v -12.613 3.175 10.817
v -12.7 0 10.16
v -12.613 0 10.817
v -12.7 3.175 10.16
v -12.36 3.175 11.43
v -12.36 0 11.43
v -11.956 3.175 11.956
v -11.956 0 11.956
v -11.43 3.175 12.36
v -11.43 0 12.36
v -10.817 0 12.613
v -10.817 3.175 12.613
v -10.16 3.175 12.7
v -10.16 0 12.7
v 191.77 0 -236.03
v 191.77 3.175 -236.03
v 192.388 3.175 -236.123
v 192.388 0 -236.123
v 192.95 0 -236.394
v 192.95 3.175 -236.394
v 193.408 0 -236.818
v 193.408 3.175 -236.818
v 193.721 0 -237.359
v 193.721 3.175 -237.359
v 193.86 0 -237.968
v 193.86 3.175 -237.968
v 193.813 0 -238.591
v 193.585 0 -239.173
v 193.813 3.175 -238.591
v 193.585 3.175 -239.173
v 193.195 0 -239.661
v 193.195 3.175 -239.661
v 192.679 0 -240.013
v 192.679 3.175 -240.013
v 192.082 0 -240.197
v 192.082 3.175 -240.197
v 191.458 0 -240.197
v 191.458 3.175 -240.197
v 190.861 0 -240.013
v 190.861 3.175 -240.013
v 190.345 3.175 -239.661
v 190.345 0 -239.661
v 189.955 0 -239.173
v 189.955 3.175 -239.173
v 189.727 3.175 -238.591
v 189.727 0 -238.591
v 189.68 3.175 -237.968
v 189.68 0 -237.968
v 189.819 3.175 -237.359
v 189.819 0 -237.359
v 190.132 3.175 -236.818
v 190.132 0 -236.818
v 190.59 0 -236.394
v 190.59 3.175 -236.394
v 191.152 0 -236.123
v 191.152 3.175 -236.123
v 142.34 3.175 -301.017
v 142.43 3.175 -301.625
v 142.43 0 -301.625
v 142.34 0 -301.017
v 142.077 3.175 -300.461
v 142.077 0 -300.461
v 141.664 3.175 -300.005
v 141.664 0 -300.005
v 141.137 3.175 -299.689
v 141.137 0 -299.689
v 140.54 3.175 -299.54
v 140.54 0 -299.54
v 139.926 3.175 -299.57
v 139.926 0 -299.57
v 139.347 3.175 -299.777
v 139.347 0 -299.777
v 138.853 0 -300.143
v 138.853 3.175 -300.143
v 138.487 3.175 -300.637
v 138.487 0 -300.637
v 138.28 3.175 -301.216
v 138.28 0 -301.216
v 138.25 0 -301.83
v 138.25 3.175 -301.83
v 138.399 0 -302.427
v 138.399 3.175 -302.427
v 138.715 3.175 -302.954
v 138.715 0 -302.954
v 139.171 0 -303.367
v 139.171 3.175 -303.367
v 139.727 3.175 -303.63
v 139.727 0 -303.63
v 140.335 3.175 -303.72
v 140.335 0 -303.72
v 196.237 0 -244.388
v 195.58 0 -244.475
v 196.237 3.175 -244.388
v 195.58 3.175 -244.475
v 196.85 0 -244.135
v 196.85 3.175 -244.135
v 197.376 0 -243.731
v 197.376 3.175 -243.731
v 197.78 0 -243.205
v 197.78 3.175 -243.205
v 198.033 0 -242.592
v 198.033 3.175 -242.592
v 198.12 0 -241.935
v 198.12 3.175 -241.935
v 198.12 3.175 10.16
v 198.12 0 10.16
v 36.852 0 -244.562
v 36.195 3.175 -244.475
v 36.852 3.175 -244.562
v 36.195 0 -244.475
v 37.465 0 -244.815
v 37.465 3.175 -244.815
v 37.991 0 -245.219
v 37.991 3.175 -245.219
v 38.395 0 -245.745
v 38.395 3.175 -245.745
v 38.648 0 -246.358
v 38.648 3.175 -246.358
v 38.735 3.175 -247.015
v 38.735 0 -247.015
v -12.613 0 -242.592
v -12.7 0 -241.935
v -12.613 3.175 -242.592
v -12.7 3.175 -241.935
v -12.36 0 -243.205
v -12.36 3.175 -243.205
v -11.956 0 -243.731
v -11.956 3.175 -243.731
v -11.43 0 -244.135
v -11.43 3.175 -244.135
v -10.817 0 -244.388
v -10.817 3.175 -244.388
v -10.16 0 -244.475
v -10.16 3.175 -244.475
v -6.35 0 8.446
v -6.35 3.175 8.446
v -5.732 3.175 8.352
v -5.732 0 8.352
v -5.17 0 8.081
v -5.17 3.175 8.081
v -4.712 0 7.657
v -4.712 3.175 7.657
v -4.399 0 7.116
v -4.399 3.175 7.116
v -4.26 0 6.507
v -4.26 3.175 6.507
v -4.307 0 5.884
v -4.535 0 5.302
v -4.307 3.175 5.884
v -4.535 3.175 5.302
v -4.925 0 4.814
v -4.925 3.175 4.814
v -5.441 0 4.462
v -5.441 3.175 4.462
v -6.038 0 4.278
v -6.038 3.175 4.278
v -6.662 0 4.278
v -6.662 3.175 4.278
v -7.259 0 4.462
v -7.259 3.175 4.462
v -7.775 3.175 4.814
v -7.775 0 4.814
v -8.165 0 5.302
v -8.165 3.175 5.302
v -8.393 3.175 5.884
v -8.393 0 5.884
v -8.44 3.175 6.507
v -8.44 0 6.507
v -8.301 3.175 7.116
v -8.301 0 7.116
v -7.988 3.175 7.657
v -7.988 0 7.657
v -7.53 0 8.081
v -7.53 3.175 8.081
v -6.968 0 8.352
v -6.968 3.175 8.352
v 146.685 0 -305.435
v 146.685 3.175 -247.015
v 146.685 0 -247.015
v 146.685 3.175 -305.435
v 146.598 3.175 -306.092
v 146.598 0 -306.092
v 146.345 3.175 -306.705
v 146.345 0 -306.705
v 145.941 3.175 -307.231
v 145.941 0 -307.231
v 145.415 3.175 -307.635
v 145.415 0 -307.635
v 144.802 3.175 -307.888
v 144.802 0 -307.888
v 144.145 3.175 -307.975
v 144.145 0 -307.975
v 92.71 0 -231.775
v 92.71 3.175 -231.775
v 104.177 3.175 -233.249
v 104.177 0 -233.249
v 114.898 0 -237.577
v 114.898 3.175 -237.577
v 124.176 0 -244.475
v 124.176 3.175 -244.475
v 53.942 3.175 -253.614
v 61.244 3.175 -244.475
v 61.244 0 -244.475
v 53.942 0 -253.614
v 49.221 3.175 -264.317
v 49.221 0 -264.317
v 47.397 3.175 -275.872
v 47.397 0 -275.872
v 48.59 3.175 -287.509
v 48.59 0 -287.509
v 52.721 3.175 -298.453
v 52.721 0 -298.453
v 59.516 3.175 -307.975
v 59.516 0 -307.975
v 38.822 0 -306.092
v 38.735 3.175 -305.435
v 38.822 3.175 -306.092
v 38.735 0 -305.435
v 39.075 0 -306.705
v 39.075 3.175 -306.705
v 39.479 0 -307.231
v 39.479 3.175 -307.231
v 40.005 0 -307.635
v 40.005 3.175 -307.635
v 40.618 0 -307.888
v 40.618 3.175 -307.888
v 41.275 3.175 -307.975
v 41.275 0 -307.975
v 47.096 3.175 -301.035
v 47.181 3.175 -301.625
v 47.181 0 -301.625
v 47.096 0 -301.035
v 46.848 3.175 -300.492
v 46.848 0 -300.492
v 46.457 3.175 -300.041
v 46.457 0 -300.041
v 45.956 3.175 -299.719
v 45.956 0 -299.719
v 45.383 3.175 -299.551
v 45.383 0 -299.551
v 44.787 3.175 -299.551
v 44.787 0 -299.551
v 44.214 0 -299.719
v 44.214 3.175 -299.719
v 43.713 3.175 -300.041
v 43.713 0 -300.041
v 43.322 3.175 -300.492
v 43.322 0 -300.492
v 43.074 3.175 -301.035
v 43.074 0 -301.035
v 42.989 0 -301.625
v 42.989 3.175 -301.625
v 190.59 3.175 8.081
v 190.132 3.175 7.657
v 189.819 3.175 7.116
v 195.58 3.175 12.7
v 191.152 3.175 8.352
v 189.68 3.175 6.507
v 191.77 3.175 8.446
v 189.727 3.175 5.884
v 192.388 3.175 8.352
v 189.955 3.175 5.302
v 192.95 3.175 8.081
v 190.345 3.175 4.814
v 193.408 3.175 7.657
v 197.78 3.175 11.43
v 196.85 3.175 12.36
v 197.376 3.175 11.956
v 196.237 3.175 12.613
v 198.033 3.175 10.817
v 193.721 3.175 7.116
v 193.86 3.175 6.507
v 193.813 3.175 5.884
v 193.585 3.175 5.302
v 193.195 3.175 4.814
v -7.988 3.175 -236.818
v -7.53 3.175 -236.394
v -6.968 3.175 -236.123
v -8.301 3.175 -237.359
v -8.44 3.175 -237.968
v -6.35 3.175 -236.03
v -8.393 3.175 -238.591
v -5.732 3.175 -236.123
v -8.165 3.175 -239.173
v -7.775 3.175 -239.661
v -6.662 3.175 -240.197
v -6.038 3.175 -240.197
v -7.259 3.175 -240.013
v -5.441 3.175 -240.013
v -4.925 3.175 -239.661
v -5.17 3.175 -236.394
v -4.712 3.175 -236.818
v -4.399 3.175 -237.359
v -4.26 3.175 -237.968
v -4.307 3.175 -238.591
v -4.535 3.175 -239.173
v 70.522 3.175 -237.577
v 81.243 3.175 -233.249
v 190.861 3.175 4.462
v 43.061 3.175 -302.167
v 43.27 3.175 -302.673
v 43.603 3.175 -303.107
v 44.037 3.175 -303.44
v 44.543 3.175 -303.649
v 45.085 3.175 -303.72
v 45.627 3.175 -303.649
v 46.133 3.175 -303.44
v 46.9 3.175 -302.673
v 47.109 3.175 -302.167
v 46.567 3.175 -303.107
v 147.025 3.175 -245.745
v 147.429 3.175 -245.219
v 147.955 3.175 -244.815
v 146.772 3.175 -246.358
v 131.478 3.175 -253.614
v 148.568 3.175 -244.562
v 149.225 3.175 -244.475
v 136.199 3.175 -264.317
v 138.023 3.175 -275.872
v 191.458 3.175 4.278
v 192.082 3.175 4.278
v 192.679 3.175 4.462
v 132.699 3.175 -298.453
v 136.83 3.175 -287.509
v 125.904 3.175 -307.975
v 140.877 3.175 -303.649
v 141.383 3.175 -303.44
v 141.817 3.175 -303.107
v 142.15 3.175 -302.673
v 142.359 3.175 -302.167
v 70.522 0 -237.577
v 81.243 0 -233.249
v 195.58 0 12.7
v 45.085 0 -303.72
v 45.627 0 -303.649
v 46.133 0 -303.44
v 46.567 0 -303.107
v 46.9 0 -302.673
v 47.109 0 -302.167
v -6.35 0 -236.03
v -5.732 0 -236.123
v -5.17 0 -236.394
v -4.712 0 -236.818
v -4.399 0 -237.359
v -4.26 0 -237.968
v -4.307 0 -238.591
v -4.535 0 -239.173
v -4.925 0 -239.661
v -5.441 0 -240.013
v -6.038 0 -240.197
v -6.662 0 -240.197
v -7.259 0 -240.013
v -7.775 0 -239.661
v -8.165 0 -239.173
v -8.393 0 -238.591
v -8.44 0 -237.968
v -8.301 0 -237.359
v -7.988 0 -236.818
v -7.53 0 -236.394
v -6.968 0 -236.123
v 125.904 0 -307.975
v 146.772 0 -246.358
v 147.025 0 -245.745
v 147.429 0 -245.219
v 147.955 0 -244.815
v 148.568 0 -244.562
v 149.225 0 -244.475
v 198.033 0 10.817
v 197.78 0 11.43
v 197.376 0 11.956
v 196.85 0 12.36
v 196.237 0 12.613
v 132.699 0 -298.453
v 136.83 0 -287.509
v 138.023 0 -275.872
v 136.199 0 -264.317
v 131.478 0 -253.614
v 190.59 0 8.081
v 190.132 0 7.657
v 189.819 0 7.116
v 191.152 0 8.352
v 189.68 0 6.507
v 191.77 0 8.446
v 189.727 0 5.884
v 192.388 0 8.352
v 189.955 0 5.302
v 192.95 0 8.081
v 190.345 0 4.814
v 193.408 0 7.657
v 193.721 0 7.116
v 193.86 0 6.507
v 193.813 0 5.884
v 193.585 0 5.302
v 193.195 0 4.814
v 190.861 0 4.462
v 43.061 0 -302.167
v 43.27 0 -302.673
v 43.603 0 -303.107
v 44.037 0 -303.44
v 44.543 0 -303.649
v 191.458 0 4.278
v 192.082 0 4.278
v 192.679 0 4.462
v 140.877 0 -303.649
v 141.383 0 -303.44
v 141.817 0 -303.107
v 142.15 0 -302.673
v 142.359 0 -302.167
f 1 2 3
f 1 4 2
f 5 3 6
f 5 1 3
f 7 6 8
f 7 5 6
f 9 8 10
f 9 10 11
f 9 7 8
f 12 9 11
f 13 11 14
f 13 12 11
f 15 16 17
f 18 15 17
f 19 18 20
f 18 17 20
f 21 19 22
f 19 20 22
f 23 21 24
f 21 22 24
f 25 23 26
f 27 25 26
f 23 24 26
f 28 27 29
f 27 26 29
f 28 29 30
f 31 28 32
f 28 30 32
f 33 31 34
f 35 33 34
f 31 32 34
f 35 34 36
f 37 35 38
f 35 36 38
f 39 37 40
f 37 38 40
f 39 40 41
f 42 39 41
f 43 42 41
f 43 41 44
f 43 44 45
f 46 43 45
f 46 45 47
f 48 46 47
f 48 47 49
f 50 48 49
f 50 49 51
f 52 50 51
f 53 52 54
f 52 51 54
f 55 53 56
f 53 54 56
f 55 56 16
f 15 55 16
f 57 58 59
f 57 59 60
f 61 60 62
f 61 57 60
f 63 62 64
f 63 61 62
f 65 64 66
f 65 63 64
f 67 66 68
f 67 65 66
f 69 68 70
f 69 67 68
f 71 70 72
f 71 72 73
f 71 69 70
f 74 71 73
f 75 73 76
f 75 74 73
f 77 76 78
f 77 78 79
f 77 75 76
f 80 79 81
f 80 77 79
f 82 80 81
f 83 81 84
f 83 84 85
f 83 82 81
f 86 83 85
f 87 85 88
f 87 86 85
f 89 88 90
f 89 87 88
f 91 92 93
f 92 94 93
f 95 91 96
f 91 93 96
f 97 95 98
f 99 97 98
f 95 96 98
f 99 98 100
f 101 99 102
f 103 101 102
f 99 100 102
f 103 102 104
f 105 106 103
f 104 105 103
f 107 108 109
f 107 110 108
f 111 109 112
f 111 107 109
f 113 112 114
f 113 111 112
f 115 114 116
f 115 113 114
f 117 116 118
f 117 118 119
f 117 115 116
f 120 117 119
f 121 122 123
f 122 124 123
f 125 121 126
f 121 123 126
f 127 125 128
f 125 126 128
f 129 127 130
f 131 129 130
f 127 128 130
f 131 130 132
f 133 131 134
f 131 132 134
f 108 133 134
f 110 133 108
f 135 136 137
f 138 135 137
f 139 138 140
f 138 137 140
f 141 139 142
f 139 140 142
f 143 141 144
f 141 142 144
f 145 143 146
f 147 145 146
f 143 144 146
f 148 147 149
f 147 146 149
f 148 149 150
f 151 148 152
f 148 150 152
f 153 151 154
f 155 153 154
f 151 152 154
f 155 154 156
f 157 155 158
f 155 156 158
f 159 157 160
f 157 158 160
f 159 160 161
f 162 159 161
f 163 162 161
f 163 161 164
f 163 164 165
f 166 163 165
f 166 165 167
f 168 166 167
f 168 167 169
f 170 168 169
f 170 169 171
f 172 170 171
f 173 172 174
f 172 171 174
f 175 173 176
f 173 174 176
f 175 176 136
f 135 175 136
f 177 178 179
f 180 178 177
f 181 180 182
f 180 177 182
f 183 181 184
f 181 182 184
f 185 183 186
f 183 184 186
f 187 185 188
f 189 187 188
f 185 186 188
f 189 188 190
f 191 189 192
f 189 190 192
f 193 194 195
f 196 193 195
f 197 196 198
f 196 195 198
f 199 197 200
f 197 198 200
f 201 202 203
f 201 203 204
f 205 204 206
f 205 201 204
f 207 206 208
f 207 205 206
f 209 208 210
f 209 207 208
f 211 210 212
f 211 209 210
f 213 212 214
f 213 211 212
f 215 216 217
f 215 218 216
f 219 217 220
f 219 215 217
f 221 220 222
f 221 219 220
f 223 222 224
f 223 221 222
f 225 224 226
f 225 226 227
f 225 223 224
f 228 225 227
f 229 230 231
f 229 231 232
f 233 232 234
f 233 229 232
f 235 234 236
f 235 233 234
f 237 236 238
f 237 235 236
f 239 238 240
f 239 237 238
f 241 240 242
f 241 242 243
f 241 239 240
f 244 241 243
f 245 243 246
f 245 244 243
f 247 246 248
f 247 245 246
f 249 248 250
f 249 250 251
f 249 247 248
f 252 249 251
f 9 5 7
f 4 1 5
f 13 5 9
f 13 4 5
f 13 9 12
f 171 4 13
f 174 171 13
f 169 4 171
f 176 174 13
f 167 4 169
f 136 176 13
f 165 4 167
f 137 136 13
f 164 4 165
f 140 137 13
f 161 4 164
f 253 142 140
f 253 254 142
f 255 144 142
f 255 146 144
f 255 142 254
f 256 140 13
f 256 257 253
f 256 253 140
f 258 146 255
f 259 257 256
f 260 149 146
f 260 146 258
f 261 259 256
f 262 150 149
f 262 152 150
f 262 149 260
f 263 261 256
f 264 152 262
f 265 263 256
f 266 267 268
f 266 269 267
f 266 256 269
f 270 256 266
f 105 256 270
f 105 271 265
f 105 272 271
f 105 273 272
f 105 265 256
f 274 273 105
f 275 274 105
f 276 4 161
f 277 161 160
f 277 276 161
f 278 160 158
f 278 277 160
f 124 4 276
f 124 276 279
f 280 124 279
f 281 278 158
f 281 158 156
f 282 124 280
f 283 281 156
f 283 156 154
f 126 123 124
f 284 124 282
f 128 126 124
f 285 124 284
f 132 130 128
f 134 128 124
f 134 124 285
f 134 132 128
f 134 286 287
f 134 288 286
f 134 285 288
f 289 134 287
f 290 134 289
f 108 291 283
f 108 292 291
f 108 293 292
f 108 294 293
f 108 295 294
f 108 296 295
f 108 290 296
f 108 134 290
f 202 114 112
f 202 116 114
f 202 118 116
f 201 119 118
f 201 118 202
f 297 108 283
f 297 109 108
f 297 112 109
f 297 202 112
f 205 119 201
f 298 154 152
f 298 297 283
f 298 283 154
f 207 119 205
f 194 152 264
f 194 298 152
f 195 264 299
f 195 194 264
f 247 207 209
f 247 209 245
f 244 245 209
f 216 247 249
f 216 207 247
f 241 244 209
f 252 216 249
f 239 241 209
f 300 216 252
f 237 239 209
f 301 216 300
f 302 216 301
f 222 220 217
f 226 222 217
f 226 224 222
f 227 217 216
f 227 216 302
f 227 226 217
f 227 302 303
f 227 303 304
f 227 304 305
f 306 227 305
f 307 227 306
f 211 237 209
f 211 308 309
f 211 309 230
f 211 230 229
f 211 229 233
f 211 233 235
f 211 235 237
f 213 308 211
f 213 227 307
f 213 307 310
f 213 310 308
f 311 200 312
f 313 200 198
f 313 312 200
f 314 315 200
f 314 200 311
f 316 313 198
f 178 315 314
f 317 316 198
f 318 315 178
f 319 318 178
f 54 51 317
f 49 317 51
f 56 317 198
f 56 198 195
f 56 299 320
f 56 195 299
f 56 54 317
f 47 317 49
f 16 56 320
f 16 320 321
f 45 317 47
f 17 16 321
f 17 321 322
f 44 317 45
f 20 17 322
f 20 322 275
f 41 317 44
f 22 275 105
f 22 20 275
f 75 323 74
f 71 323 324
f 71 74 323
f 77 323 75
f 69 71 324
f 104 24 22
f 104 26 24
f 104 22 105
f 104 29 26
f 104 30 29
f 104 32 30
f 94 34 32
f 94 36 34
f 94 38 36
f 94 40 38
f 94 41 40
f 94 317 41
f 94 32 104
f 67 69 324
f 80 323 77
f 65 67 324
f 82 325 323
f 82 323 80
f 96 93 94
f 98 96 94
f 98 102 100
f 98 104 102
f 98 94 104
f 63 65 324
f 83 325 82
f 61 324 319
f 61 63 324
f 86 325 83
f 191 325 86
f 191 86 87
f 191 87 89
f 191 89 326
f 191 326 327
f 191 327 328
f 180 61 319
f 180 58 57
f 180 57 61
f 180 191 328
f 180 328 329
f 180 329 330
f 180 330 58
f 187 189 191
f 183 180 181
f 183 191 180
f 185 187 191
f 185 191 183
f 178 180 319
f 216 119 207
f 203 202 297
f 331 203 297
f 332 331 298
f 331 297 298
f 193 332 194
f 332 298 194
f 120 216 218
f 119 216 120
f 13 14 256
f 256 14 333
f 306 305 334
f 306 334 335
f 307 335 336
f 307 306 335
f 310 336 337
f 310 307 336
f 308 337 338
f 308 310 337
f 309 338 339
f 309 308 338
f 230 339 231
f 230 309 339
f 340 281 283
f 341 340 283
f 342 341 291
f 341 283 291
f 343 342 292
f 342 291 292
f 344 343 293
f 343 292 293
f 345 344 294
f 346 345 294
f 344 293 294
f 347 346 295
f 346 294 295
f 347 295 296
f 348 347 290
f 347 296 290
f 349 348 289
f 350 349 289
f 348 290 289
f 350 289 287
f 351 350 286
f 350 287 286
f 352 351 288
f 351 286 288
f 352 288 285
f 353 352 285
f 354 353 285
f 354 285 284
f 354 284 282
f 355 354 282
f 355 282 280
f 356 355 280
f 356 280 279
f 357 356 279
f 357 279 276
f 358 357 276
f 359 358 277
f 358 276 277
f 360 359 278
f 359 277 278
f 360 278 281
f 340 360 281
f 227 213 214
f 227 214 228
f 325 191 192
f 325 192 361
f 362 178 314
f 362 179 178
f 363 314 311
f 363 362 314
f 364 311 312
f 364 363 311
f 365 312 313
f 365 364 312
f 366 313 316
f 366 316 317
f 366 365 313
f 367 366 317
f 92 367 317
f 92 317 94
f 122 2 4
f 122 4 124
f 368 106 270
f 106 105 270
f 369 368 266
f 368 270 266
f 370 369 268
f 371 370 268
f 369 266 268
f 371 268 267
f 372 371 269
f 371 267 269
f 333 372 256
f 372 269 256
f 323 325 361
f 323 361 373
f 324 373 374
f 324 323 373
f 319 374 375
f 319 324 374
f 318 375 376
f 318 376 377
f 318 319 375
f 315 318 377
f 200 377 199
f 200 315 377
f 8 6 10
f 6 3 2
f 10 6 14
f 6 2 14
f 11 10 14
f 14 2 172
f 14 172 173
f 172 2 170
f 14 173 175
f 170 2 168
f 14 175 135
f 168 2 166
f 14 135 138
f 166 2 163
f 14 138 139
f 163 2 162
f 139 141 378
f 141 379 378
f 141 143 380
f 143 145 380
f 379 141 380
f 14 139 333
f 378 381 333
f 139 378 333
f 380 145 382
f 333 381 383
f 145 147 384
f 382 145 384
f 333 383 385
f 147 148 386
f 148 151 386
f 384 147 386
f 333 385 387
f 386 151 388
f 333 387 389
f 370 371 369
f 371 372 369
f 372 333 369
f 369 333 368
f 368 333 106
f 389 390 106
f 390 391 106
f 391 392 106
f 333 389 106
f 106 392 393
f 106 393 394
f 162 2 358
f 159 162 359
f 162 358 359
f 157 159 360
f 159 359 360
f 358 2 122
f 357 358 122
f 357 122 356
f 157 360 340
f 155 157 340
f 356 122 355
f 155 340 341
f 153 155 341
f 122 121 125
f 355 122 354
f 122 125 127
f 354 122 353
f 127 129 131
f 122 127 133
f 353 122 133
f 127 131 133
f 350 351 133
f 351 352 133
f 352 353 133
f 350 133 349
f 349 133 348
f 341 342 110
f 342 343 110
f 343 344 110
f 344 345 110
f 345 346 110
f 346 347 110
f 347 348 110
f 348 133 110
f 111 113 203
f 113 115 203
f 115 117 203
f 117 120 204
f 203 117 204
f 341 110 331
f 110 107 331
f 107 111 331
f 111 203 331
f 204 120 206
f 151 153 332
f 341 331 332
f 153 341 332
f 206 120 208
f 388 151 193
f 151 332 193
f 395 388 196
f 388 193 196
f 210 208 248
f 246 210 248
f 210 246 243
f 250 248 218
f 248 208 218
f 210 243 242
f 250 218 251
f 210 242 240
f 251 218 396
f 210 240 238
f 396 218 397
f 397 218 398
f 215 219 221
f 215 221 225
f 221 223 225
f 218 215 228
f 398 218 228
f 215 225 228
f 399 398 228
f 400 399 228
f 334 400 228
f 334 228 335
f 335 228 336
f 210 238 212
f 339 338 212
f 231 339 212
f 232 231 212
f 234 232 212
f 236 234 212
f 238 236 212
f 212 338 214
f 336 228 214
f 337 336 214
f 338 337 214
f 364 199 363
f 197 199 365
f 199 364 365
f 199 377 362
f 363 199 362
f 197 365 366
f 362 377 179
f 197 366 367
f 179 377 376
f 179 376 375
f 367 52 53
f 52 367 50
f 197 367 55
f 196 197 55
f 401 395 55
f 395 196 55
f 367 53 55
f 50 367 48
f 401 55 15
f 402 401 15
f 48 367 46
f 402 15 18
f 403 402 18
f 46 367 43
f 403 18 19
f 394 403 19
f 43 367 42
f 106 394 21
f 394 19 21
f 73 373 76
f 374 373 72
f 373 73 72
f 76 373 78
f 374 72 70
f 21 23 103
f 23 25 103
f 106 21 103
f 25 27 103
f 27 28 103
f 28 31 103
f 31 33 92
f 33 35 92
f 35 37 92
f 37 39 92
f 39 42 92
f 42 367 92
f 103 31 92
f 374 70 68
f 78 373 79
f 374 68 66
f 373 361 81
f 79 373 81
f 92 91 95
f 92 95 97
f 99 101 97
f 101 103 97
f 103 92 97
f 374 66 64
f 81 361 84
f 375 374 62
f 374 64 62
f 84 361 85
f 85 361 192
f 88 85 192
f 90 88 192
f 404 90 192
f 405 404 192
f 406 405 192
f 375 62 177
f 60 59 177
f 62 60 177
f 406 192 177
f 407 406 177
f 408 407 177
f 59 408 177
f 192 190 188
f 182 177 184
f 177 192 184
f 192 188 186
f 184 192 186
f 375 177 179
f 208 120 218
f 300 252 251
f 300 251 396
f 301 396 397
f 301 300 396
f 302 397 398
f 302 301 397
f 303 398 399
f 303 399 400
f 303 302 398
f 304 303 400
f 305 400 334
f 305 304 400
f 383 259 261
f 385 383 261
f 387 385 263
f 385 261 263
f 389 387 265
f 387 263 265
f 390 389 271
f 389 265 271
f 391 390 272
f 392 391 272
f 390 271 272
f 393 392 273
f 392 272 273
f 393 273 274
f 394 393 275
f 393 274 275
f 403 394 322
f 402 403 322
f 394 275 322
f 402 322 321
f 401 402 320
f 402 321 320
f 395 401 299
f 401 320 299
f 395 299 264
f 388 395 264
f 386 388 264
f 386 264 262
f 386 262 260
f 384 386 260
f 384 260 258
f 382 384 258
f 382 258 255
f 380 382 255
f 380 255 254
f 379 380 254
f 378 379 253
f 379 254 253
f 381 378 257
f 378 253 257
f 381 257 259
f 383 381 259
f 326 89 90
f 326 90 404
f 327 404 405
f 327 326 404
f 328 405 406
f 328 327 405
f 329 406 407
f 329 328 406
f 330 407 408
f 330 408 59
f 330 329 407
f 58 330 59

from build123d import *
from build123d.topology import SkipClean

# Parameters (mm, degrees)
SKETCH1_W           = 210.82
SKETCH1_H           = 257.175
BOSS_EXTRUDE1_DEPTH = 3.175
SKETCH3_R           = 2.0955
CUT_EXTRUDE1_DEPTH  = 3.175
SKETCH3_3_R         = 2.0955
BOSS_EXTRUDE2_DEPTH = 3.175
FILLET1_R           = 2.54


with BuildPart() as part:
    # Sketch1 → Boss-Extrude1 (new body)
    with BuildSketch(Plane(origin=(0, 0, 0), x_dir=(1, 0, 0), z_dir=(0, 1, 0))):
        with Locations((92.71, 115.8875)):
            Rectangle(SKETCH1_W, SKETCH1_H)
    extrude(amount=BOSS_EXTRUDE1_DEPTH)

    # Sketch3 → Cut-Extrude1 (cut)
    with BuildSketch(Plane(origin=(0, 3.175, 0), x_dir=(1, 0, 0), z_dir=(0, 1, 0))):
        with BuildLine():
            ThreePointArc((61.244272613, 244.475), (92.71, 231.775), (124.175727387, 244.475))
            Line((124.175727387, 244.475), (61.244272613, 244.475))
        make_face()
        with Locations((-6.35, 238.125)):
            Circle(SKETCH3_R)
        with Locations((191.77, 238.125)):
            Circle(SKETCH3_R)
        with Locations((191.77, -6.35)):
            Circle(SKETCH3_R)
        with Locations((-6.35, -6.35)):
            Circle(SKETCH3_R)
    extrude(amount=-CUT_EXTRUDE1_DEPTH, mode=Mode.SUBTRACT)

    # Sketch3_3 → Boss-Extrude2 (add)
    # profile 1 of 2: a face of its own
    with SkipClean():  # the faces are left unmerged after this step: merging them gives an invalid solid
        with BuildSketch(Plane(origin=(0, 3.175, 0), x_dir=(1, 0, 0), z_dir=(0, 1, 0))):
            with BuildLine():
                Line((38.735, 244.475), (61.244272613, 244.475))
                ThreePointArc((61.244272613, 244.475), (47.396783015, 275.871603687), (59.515843888, 307.975))
                Line((59.515843888, 307.975), (38.735, 307.975))
                Line((38.735, 307.975), (38.735, 244.475))
            make_face()
            with Locations((45.085, 301.625)):
                Circle(SKETCH3_3_R, mode=Mode.SUBTRACT)
        # profile 2 of 2: a face of its own
        with BuildSketch(Plane(origin=(0, 3.175, 0), x_dir=(1, 0, 0), z_dir=(0, 1, 0))):
            with BuildLine():
                Line((124.175727387, 244.475), (146.685, 244.475))
                Line((146.685, 244.475), (146.685, 307.975))
                Line((146.685, 307.975), (125.904156112, 307.975))
                ThreePointArc((125.904156112, 307.975), (138.023216985, 275.871603687), (124.175727387, 244.475))
            make_face()
            with Locations((140.335, 301.625)):
                Circle(SKETCH3_3_R, mode=Mode.SUBTRACT)
        extrude(amount=-BOSS_EXTRUDE2_DEPTH)

    # Fillet1
    fillet1_edges = [part.edges().sort_by_distance(p)[0] for p in [
        (38.735, 1.5875, -244.475),
        (146.685, 1.5875, -244.475),
        (38.735, 1.5875, -307.975),
        (146.685, 1.5875, -307.975),
        (-12.7, 1.5875, 12.7),
        (-12.7, 1.5875, -244.475),
        (198.12, 1.5875, -244.475),
        (198.12, 1.5875, 12.7),
    ]]
    fillet(fillet1_edges, radius=FILLET1_R)


solid = part.part
